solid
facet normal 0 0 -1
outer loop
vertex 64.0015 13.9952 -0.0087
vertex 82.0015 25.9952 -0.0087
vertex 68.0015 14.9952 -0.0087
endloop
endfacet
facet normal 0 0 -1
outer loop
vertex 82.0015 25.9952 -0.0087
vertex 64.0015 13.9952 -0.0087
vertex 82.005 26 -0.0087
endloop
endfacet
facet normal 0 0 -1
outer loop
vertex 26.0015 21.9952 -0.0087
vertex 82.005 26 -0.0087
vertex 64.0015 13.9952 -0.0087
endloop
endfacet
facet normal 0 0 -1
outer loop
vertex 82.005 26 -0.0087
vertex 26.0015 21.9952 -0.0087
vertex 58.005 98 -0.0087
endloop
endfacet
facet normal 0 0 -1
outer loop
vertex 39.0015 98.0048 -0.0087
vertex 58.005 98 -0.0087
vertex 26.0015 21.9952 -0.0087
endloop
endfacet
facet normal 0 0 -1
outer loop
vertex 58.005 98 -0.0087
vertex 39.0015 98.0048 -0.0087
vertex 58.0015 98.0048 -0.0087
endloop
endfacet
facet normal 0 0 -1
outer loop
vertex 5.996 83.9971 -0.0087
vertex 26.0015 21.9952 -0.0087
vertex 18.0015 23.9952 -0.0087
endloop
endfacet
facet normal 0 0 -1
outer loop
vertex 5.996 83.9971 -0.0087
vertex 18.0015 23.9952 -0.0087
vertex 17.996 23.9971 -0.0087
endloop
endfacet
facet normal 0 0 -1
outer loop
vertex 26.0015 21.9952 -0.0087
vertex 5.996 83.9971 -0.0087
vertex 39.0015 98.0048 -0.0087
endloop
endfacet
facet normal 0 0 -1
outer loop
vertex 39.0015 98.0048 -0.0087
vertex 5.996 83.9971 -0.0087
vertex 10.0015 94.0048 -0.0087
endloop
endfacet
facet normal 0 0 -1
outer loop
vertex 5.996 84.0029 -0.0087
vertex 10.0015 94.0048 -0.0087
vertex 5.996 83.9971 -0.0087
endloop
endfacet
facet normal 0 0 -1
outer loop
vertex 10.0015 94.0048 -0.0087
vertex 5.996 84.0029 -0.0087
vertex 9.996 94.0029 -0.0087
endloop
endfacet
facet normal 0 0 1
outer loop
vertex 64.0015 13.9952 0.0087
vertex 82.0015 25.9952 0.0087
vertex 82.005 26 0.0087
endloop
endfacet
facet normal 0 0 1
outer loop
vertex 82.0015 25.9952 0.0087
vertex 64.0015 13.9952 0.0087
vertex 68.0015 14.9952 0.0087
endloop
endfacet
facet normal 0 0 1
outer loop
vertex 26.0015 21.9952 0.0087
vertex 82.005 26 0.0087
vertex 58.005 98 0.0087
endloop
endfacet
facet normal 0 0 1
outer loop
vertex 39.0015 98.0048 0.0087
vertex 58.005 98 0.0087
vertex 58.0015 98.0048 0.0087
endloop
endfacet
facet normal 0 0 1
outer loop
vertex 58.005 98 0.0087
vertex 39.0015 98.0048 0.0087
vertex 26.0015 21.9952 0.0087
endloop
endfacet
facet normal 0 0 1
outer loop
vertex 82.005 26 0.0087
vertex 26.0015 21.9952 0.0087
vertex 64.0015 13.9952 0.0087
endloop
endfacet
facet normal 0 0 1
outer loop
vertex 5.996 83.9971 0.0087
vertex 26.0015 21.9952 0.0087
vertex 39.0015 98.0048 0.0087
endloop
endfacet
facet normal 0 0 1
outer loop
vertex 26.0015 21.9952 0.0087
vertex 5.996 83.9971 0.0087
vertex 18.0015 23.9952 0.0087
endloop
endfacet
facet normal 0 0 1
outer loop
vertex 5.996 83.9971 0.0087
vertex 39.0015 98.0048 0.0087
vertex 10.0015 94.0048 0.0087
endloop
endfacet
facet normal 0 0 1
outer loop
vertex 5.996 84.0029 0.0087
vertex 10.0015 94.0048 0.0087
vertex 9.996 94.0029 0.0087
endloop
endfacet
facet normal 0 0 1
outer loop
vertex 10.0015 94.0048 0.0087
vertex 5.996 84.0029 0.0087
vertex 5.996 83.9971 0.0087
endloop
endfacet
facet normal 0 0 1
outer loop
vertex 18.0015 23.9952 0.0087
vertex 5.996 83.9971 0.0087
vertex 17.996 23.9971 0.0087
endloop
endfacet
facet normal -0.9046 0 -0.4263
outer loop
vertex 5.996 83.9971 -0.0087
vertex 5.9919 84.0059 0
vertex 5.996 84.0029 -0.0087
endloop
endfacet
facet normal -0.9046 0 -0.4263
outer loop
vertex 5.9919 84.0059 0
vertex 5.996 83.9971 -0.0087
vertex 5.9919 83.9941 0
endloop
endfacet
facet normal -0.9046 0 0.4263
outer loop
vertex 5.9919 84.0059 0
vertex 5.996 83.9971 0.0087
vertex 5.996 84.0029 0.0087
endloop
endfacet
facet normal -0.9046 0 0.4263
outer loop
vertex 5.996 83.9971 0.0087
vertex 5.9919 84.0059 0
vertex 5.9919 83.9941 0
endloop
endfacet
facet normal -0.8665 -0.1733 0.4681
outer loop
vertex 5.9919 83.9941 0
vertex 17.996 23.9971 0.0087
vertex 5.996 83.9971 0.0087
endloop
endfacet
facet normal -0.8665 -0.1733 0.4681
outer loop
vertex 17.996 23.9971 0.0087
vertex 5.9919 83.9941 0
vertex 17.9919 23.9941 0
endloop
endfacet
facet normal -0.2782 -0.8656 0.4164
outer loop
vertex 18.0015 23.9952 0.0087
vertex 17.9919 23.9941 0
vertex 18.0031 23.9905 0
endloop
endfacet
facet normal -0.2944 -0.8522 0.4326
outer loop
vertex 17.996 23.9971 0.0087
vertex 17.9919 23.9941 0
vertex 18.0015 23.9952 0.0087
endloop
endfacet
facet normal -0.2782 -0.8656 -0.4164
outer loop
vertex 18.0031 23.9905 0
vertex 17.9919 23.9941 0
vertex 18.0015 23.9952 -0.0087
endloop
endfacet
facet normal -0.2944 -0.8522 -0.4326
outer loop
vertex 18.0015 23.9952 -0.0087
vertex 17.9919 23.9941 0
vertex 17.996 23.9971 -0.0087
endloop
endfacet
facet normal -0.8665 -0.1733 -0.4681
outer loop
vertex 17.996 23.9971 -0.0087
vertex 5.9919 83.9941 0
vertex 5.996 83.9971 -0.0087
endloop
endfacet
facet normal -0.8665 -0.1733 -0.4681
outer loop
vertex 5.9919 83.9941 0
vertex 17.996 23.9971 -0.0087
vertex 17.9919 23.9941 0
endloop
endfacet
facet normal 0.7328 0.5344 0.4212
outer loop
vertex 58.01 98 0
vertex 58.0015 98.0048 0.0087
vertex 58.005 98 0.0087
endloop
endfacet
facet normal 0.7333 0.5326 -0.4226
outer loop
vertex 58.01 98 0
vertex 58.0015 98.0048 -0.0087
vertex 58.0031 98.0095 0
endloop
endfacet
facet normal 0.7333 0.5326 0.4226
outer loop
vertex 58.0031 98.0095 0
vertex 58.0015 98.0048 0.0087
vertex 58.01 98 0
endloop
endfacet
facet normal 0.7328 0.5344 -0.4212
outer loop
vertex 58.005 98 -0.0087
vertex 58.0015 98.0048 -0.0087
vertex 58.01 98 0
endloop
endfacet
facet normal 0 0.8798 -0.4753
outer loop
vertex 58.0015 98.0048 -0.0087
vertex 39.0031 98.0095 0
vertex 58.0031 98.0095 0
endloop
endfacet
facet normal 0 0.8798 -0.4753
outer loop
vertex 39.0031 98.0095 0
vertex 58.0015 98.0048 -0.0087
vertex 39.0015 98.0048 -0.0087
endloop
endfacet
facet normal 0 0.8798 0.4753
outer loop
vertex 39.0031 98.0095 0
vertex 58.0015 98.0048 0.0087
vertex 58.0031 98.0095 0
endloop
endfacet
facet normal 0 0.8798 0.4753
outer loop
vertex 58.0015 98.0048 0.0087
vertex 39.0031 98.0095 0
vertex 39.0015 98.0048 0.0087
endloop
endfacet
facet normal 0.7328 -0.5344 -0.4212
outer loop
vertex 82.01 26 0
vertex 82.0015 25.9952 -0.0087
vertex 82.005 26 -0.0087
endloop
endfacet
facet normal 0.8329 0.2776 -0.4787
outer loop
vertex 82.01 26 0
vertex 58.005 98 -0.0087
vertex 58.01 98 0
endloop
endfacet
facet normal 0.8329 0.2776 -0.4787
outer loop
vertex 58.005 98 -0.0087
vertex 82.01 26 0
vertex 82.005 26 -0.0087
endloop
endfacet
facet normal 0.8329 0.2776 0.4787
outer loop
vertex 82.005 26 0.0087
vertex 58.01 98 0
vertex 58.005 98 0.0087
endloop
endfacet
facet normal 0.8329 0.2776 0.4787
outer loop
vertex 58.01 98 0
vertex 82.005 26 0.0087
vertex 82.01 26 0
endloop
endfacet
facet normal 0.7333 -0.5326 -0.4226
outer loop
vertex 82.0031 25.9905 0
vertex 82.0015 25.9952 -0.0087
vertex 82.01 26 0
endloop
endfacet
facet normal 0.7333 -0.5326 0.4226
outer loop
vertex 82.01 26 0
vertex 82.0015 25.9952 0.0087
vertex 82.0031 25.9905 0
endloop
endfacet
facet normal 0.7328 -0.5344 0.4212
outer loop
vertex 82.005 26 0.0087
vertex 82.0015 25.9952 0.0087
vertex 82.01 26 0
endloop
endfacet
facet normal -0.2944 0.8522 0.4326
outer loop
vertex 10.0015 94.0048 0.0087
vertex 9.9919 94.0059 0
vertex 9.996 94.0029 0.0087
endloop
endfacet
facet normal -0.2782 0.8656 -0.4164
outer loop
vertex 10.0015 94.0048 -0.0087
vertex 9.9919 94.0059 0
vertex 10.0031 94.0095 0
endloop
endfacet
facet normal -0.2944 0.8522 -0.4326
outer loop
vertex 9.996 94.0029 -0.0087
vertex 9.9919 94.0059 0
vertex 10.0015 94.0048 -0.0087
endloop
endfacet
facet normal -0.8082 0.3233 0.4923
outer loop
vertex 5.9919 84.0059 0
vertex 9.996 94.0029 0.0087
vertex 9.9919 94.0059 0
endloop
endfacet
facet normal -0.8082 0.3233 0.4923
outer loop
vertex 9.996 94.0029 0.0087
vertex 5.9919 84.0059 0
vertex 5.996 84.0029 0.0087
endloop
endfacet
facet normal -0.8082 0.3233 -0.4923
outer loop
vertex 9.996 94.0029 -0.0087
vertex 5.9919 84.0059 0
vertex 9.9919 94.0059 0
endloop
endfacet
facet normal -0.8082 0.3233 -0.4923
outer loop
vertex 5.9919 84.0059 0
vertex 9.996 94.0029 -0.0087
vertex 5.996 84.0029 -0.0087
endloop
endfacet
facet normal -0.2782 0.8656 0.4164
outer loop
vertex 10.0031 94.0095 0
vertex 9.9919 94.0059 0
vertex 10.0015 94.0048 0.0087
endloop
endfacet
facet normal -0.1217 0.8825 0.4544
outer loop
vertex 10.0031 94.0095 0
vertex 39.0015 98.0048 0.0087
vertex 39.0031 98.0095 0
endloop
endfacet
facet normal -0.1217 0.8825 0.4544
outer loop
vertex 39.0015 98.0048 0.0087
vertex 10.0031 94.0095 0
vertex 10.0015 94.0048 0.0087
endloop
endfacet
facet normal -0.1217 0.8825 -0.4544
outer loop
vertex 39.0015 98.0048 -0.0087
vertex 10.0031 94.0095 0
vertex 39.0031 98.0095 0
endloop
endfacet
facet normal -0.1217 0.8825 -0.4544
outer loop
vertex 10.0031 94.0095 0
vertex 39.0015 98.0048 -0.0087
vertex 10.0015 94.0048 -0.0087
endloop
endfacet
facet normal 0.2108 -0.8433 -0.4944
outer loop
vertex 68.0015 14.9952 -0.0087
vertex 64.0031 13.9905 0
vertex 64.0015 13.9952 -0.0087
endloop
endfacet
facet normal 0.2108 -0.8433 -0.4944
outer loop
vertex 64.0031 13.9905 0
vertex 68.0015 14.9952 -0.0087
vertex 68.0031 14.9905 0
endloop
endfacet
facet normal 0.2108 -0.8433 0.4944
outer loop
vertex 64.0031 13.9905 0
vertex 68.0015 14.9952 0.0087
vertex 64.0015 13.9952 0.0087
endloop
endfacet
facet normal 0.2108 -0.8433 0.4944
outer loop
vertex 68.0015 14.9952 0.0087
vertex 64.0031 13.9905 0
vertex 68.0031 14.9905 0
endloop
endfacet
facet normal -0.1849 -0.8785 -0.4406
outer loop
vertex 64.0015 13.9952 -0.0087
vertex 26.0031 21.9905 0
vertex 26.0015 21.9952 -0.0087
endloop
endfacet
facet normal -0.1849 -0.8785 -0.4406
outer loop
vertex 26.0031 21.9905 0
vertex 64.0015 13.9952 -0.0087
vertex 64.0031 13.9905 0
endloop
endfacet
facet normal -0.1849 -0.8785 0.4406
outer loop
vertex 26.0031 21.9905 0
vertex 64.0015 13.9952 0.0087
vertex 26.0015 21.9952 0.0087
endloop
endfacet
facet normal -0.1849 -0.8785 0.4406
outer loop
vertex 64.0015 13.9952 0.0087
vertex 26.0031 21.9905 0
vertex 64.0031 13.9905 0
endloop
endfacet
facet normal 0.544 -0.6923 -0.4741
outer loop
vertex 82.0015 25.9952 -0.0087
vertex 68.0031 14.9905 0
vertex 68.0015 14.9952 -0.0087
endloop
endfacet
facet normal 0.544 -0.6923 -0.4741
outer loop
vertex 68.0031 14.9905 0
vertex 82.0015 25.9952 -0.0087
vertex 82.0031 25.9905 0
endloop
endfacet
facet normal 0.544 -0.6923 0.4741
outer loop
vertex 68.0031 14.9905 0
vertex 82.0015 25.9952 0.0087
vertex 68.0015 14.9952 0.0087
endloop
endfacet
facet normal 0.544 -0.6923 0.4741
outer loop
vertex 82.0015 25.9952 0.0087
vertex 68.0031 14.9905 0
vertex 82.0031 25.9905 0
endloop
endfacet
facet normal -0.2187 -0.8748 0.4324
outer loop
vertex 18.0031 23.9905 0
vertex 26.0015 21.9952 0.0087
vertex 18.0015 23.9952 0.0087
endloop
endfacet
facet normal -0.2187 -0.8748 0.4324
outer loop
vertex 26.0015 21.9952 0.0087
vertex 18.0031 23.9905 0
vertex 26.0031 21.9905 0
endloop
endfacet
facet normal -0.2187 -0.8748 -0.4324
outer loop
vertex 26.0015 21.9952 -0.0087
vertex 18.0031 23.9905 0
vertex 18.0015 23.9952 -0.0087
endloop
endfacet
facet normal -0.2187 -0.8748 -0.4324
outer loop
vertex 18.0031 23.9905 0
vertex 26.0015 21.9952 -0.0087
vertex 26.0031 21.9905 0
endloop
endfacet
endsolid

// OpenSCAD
color([0.9269770591996176,0.12480324665016229,0.8422397758241813]) hull(){
    translate([18,58]) sphere(0.01);
    translate([22,90]) sphere(0.01);
    translate([44,55]) sphere(0.01);
}
color([0.028249143050612435,0.8554899328562455,0.6212809598996976]) hull(){
    translate([18,58]) sphere(0.01);
    translate([22,90]) sphere(0.01);
    translate([6,84]) sphere(0.01);
}
color([0.6435486749275994,0.4857227915978113,0.2898251547629681]) hull(){
    translate([18,58]) sphere(0.01);
    translate([44,55]) sphere(0.01);
    translate([44,47]) sphere(0.01);
}
color([0.21709076393122206,0.4979948584580751,0.6176241526046676]) hull(){
    translate([18,58]) sphere(0.01);
    translate([6,84]) sphere(0.01);
    translate([18,24]) sphere(0.01);
}
color([0.4722249532281336,0.7228331534363125,0.6109414561657331]) hull(){
    translate([18,58]) sphere(0.01);
    translate([18,24]) sphere(0.01);
    translate([44,47]) sphere(0.01);
}
color([0.5330085163671737,0.6769359871291822,0.5973748769978083]) hull(){
    translate([58,98]) sphere(0.01);
    translate([50,93]) sphere(0.01);
    translate([44,55]) sphere(0.01);
}
color([0.14460255854654236,0.21273280877313017,0.8417179364881341]) hull(){
    translate([58,98]) sphere(0.01);
    translate([50,93]) sphere(0.01);
    translate([39,98]) sphere(0.01);
}
color([0.6300391880279899,0.5103677782275869,0.4479627161837708]) hull(){
    translate([58,98]) sphere(0.01);
    translate([44,55]) sphere(0.01);
    translate([82,26]) sphere(0.01);
}
color([0.2903518628620462,0.1744676713524972,0.5457372127765215]) hull(){
    translate([22,90]) sphere(0.01);
    translate([50,93]) sphere(0.01);
    translate([44,55]) sphere(0.01);
}
color([0.6340658375422632,0.7004271366493812,0.690956934786038]) hull(){
    translate([22,90]) sphere(0.01);
    translate([50,93]) sphere(0.01);
    translate([39,98]) sphere(0.01);
}
color([0.013948469234104865,0.8018456354370093,0.2607079205191076]) hull(){
    translate([22,90]) sphere(0.01);
    translate([10,94]) sphere(0.01);
    translate([6,84]) sphere(0.01);
}
color([0.01899716010339858,0.7507132946374245,0.44168653561511173]) hull(){
    translate([22,90]) sphere(0.01);
    translate([10,94]) sphere(0.01);
    translate([39,98]) sphere(0.01);
}
color([0.1668653701245908,0.45955837321901094,0.7876756969907556]) hull(){
    translate([44,55]) sphere(0.01);
    translate([58,33]) sphere(0.01);
    translate([82,26]) sphere(0.01);
}
color([0.09564527702692727,0.06733136152719421,0.7816649665975636]) hull(){
    translate([44,55]) sphere(0.01);
    translate([58,33]) sphere(0.01);
    translate([44,47]) sphere(0.01);
}
color([0.030385075649315252,0.33346286891595733,0.08647112242809318]) hull(){
    translate([64,14]) sphere(0.01);
    translate([68,15]) sphere(0.01);
    translate([58,33]) sphere(0.01);
}
color([0.8161439782233904,0.05657658467482607,0.8243668117903717]) hull(){
    translate([64,14]) sphere(0.01);
    translate([58,33]) sphere(0.01);
    translate([42,29]) sphere(0.01);
}
color([0.05808931884644186,0.6181904095369413,0.1426995958976538]) hull(){
    translate([64,14]) sphere(0.01);
    translate([42,29]) sphere(0.01);
    translate([26,22]) sphere(0.01);
}
color([0.3846464495954227,0.3794414211645075,0.7643773332264734]) hull(){
    translate([68,15]) sphere(0.01);
    translate([58,33]) sphere(0.01);
    translate([82,26]) sphere(0.01);
}
color([0.3116889002403487,0.7690158776827113,0.7674729074453902]) hull(){
    translate([58,33]) sphere(0.01);
    translate([42,29]) sphere(0.01);
    translate([44,47]) sphere(0.01);
}
color([0.3394448706328078,0.45855440081433096,0.0007502935671159783]) hull(){
    translate([42,29]) sphere(0.01);
    translate([26,22]) sphere(0.01);
    translate([44,47]) sphere(0.01);
}
color([0.8084995756647368,0.0331322283588068,0.9954935019736515]) hull(){
    translate([26,22]) sphere(0.01);
    translate([18,24]) sphere(0.01);
    translate([44,47]) sphere(0.01);
}
